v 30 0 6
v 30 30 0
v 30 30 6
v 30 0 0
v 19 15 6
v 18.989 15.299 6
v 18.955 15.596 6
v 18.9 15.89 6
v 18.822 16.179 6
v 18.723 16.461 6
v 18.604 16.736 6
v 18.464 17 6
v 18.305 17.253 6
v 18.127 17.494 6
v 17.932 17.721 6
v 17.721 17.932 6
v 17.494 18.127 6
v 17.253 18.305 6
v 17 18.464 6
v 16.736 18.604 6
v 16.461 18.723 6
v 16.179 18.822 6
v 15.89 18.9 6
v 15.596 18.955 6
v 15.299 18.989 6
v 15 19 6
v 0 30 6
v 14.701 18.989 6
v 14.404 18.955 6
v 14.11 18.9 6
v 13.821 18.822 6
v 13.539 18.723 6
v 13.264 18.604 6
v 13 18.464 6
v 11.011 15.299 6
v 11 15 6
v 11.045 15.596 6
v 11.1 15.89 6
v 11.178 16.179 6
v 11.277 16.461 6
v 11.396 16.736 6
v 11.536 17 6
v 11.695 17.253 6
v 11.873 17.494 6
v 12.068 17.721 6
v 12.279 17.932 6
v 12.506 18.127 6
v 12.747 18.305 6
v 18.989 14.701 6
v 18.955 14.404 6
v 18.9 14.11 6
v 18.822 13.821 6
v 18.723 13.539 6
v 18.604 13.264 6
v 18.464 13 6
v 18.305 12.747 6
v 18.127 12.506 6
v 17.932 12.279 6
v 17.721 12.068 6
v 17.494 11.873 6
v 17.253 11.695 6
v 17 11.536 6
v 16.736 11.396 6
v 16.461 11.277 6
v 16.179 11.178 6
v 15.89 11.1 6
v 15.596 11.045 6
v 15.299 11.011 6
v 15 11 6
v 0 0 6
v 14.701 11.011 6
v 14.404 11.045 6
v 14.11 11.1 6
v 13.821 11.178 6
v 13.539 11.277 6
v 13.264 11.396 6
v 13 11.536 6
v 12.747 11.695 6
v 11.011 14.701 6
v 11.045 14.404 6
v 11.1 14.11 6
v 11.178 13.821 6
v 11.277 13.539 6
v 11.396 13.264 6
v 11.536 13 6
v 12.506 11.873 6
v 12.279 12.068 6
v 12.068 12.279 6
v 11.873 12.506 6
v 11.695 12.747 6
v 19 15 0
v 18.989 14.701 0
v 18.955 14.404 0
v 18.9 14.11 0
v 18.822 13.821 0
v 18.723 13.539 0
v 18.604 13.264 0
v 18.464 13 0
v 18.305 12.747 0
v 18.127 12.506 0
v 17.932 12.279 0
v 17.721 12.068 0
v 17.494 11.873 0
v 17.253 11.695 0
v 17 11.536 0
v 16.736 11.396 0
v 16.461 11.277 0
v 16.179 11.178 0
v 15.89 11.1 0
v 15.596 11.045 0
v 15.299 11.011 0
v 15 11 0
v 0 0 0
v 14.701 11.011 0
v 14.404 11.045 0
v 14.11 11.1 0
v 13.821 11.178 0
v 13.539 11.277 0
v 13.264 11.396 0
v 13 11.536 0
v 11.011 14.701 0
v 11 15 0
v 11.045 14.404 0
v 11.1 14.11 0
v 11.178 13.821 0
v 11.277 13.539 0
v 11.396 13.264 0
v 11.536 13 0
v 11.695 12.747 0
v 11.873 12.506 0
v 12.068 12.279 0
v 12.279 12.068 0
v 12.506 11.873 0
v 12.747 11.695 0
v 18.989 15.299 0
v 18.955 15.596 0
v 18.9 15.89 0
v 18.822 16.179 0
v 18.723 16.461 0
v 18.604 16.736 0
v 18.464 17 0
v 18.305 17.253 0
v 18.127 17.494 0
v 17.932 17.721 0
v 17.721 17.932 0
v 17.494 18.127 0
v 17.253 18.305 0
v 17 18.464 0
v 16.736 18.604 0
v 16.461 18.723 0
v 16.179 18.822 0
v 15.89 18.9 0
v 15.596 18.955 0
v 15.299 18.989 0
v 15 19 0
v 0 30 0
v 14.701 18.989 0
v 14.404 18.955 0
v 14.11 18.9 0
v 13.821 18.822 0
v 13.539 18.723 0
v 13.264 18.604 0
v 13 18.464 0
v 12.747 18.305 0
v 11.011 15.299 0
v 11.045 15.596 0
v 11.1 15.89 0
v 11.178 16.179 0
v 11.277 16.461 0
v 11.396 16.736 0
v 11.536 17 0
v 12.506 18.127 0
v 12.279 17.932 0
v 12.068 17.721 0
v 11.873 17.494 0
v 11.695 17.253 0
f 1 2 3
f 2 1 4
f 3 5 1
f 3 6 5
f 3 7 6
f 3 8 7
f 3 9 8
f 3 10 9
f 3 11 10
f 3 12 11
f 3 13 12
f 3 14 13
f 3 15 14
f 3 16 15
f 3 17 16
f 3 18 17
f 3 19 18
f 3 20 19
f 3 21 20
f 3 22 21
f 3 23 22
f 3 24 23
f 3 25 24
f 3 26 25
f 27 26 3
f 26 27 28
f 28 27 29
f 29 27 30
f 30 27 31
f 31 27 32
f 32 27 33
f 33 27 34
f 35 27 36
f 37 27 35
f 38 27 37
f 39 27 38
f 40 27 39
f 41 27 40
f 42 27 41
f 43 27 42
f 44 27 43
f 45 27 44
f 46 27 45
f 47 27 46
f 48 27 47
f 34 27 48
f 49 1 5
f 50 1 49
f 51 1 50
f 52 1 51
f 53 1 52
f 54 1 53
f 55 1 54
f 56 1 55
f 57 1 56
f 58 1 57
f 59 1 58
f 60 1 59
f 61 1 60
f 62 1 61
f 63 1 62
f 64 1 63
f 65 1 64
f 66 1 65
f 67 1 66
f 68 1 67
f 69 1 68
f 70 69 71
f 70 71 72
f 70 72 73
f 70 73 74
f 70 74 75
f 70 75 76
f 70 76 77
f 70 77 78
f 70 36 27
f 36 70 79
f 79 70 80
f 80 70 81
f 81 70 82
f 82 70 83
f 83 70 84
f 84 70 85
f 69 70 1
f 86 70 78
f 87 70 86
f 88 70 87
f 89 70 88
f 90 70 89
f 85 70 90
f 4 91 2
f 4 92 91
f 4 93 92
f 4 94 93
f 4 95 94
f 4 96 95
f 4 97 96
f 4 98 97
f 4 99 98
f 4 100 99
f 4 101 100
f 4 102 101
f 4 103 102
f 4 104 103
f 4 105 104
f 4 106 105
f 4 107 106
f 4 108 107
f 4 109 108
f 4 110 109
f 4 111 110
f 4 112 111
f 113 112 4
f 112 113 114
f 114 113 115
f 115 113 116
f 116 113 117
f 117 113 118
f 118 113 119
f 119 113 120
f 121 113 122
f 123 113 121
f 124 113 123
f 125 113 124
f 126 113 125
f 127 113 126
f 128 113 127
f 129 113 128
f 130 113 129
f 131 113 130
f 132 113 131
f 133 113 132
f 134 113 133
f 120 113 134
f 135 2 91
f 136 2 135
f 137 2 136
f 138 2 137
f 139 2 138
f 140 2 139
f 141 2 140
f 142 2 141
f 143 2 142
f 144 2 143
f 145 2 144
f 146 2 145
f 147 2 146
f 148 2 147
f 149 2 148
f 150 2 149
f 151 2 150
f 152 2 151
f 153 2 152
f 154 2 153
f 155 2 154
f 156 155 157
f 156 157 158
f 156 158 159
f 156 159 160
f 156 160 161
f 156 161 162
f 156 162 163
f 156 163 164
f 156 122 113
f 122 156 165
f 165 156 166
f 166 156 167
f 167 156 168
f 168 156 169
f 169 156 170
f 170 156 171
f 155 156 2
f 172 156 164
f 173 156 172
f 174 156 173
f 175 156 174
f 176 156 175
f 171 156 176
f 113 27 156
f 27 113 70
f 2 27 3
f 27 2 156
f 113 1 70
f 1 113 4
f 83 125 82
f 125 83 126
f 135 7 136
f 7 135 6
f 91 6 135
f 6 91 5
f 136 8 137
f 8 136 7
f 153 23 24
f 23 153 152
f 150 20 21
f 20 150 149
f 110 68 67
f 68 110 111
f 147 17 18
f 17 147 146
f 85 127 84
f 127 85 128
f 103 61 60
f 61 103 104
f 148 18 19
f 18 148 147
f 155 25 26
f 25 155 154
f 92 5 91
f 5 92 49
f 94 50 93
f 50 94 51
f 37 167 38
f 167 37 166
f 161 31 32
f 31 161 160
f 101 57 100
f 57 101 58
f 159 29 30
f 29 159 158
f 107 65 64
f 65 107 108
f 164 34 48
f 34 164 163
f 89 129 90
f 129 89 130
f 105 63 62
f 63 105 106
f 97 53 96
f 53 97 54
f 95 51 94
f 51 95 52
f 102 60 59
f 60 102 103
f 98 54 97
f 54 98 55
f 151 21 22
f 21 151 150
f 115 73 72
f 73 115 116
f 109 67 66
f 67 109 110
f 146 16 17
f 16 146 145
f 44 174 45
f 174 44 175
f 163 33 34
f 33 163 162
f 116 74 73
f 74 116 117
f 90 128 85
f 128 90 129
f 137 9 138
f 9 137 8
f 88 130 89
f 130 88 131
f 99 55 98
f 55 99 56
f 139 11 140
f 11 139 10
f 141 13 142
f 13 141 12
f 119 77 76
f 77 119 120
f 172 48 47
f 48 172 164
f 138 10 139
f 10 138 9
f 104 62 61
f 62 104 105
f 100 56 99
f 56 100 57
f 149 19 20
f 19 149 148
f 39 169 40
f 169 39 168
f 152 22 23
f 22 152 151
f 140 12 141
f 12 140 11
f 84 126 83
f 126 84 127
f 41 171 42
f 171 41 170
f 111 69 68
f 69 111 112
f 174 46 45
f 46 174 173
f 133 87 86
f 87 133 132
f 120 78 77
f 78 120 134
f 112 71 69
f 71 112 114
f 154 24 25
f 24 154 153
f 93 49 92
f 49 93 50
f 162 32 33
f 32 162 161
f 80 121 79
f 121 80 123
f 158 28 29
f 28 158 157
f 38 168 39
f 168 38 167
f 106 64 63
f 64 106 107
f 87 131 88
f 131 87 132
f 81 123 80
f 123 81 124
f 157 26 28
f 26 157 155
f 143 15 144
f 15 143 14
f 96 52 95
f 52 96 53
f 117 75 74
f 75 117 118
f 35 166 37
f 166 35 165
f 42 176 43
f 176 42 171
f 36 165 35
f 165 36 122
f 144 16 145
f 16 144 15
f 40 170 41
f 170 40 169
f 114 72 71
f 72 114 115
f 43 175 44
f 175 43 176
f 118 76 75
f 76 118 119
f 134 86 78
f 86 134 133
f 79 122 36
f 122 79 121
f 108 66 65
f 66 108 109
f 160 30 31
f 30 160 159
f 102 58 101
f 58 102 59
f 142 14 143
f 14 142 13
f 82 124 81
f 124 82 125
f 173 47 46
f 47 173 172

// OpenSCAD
// The correct version of features_coarse_fn_fail: same Ø8 hole, fine enough
// segments that the across-flats deficit is negligible.

$fa = 2; $fs = 0.3;

// EXPECTED_BBOX: [30, 30, 6]
// EXPECTED_HOLE: [15, 15, 0, "Z", 8.0]

difference() {
    translate([0, 0, 0]) cube([30, 30, 6]);
    translate([15, 15, -1]) cylinder(d = 8, h = 8);
}
